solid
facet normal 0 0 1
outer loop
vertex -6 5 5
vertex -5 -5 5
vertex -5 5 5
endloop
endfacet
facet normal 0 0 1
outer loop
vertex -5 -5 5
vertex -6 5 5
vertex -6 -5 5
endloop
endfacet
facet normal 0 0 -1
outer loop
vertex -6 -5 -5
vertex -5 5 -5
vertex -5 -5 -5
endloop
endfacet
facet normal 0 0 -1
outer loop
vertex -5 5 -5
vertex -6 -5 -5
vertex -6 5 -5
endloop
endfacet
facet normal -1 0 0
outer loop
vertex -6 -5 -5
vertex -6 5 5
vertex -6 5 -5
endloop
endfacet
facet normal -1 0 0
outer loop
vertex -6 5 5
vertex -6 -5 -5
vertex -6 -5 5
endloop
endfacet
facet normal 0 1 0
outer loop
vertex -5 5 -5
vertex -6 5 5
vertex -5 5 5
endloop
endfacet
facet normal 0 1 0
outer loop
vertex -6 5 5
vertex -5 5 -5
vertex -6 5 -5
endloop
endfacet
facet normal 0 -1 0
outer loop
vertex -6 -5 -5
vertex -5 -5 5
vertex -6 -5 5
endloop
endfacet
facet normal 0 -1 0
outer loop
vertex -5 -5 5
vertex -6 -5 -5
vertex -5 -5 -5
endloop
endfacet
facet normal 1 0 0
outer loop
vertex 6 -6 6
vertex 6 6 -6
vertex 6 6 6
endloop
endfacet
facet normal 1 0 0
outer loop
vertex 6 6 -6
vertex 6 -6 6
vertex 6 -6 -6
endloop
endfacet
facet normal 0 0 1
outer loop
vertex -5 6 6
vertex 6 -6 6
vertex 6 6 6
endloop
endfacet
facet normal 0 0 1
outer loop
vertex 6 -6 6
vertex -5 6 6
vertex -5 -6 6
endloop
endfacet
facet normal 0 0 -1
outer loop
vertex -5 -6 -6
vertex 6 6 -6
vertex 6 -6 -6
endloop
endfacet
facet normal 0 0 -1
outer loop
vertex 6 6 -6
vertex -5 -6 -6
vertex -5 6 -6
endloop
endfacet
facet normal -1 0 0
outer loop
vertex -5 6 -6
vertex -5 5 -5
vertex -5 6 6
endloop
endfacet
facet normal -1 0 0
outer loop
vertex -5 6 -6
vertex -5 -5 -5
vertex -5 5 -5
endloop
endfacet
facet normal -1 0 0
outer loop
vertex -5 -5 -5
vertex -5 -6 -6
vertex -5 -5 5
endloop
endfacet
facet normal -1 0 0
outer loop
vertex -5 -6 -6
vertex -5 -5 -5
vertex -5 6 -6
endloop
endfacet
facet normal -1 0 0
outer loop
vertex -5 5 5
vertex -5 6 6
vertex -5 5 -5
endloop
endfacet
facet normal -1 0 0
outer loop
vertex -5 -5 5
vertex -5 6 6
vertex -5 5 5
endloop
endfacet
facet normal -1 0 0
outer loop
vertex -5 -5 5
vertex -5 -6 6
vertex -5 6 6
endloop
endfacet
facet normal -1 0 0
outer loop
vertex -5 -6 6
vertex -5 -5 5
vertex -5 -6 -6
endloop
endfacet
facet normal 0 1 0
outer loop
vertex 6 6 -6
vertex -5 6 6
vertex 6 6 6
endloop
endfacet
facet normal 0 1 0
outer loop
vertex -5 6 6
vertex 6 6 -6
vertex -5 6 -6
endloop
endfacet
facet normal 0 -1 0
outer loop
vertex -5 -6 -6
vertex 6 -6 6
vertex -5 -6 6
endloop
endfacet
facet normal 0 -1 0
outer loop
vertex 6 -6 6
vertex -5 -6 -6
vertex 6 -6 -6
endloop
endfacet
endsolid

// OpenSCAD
// Unit of length: Unit.MM
union()
{
   color(c = [1.0, 0.0, 0.0, 1.0])
   {
      translate(v = [-0.5, 0.0, 0.0])
      {
         cube(size = [11.0, 10.0, 10.0], center = true);
      }
   }
   translate(v = [0.5, 0.0, 0.0])
   {
      cube(size = [11.0, 12.0, 12.0], center = true);
   }
}
